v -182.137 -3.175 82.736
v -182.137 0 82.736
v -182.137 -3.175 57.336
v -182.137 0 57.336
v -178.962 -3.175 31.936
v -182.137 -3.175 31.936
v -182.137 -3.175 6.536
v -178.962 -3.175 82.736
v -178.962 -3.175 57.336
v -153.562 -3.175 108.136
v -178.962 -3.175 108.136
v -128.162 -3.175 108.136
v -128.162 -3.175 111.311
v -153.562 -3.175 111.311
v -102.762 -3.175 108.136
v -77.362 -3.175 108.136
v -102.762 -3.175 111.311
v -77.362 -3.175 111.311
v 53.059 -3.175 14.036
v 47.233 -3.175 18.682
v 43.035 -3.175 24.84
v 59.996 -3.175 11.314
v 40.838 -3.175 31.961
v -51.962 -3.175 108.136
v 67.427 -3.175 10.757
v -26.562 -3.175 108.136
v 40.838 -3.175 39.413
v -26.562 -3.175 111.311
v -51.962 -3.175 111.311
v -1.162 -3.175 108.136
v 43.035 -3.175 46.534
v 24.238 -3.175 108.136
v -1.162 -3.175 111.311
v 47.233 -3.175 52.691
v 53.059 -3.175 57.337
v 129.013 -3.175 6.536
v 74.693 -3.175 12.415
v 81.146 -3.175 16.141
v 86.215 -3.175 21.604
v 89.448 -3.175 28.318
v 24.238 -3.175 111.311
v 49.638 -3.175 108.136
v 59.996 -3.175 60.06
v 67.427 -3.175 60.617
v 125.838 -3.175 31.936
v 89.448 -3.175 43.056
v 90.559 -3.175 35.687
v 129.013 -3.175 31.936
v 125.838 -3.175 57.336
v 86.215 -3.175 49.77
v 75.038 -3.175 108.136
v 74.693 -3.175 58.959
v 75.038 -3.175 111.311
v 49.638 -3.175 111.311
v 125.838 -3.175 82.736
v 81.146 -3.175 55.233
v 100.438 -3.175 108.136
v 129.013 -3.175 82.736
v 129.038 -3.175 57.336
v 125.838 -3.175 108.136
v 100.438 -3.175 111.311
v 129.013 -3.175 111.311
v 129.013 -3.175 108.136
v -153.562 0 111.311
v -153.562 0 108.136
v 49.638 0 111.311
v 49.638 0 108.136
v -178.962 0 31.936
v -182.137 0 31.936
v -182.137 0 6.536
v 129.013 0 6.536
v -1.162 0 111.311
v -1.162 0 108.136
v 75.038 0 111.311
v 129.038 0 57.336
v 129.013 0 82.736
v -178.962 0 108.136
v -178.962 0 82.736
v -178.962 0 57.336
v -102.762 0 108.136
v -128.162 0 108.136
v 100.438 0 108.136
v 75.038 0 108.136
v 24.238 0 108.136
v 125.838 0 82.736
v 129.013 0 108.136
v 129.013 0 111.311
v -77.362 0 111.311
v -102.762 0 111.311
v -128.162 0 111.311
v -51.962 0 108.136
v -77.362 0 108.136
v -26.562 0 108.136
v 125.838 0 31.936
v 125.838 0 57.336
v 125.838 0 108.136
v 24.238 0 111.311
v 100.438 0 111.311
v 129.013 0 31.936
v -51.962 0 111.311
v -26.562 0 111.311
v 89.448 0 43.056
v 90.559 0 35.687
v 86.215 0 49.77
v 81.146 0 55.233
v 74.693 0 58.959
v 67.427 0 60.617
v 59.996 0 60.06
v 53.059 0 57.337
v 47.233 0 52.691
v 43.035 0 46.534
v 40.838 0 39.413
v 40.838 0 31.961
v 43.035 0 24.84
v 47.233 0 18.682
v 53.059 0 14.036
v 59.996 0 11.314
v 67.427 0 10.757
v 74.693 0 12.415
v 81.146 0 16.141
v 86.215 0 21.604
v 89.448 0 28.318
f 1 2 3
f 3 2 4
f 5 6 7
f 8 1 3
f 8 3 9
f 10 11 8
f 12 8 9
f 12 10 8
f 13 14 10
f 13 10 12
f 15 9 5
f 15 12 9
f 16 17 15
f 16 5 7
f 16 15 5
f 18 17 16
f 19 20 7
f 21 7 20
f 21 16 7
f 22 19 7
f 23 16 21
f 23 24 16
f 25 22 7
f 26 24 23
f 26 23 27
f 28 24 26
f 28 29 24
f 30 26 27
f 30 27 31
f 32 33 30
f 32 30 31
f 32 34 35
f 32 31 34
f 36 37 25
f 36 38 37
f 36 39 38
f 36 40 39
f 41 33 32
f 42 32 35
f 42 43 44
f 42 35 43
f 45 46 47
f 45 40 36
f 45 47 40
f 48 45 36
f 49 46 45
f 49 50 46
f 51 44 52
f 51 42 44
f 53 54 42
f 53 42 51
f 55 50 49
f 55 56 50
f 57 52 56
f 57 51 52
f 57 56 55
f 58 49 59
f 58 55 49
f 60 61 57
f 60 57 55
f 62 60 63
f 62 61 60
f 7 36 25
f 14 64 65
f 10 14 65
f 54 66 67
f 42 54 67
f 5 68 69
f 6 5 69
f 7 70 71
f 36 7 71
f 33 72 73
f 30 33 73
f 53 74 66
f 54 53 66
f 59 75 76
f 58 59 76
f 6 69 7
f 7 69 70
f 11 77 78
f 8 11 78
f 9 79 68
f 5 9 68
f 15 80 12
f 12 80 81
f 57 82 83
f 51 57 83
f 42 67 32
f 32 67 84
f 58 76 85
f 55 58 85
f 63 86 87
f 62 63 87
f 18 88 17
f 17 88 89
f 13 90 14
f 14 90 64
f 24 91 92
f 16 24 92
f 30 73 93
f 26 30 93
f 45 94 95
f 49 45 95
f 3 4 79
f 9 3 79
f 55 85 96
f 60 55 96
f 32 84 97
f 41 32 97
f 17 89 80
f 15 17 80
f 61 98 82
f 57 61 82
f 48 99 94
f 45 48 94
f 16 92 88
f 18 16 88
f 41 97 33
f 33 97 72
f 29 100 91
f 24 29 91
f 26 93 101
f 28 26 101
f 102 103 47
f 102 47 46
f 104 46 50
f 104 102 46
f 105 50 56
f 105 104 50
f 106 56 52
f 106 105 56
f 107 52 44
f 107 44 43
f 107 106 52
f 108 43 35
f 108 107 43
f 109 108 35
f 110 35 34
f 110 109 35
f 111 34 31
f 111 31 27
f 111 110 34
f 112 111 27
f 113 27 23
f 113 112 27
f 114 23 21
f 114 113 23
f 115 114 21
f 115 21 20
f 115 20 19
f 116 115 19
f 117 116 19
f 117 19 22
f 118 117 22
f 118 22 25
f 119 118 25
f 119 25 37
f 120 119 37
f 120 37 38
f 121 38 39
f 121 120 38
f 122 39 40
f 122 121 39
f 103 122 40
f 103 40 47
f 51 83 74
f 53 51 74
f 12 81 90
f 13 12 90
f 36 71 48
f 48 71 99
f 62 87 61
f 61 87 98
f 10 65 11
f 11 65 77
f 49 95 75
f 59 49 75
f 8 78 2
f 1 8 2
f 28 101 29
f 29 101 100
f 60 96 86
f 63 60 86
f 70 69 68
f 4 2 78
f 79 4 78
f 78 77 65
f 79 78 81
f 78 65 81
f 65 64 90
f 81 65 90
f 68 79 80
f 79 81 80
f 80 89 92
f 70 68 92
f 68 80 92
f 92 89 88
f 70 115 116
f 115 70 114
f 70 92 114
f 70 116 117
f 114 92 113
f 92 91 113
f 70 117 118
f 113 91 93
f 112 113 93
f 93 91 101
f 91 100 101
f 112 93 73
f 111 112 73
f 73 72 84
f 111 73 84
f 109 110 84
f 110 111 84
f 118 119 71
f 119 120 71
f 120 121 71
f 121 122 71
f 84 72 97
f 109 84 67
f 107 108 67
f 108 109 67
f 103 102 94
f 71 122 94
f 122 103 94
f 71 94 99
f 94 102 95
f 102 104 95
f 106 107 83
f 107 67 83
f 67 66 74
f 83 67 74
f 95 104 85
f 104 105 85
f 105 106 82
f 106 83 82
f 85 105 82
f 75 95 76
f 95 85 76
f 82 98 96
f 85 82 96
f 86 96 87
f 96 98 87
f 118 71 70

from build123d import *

# Parameters (mm, degrees)
F0_R     = 25
F1_DEPTH = 3.175


# Not quite as in the source:
# - a length typed as a fraction of an inch, garbled in the dataset ("3 / 203.2 mm" for 3/8 in), is restored


with BuildPart() as f1:
    # F0 (on Front) → F1 (new body)
    with BuildSketch(Plane.XZ):
        Polygon((-182.1372853069, 6.5356151886), (-178.9622853069, 6.5356151886), (125.8377146931, 6.5356151886), (129.0127146931, 6.5356151886), (129.0127146931, 31.9356151886), (125.8377146931, 31.9356151886), (125.8377146931, 57.3356151886), (129.0377632678, 57.3356151886), (129.0127146931, 82.7356151886), (125.8377146931, 82.7356151886), (125.8377146931, 108.1356151886), (129.0127146931, 108.1356151886), (129.0127146931, 111.3106151886), (125.8377146931, 111.3106151886), (100.4377146931, 111.3106151886), (100.4377146931, 108.1356151886), (75.0377146931, 108.1356151886), (75.0377146931, 111.3106151886), (49.6377146931, 111.3106151886), (49.6377146931, 108.1356151886), (24.2377146931, 108.1356151886), (24.2377146931, 111.3106151886), (-1.1622853069, 111.3106151886), (-1.1622853069, 108.1356151886), (-26.5622853069, 108.1356151886), (-26.5622853069, 111.3106151886), (-51.9622853069, 111.3106151886), (-51.9622853069, 108.1356151886), (-77.3622853069, 108.1356151886), (-77.3622853069, 111.3106151886), (-102.7622853069, 111.3106151886), (-102.7622853069, 108.1356151886), (-128.1622853069, 108.1356151886), (-128.1622853069, 111.3106151886), (-153.5622853069, 111.3106151886), (-153.5622853069, 108.1356151886), (-178.9622853069, 108.1356151886), (-178.9622853069, 82.7356151886), (-182.1372853069, 82.7356151886), (-182.1372853069, 57.3356151886), (-178.9622853069, 57.3356151886), (-178.9622853069, 31.9356151886), (-182.1372853069, 31.9356151886), align=None)
        with Locations((65.5590817332, 35.6867462397)):
            Circle(F0_R, mode=Mode.SUBTRACT)
    extrude(amount=F1_DEPTH)


solid = f1.part
